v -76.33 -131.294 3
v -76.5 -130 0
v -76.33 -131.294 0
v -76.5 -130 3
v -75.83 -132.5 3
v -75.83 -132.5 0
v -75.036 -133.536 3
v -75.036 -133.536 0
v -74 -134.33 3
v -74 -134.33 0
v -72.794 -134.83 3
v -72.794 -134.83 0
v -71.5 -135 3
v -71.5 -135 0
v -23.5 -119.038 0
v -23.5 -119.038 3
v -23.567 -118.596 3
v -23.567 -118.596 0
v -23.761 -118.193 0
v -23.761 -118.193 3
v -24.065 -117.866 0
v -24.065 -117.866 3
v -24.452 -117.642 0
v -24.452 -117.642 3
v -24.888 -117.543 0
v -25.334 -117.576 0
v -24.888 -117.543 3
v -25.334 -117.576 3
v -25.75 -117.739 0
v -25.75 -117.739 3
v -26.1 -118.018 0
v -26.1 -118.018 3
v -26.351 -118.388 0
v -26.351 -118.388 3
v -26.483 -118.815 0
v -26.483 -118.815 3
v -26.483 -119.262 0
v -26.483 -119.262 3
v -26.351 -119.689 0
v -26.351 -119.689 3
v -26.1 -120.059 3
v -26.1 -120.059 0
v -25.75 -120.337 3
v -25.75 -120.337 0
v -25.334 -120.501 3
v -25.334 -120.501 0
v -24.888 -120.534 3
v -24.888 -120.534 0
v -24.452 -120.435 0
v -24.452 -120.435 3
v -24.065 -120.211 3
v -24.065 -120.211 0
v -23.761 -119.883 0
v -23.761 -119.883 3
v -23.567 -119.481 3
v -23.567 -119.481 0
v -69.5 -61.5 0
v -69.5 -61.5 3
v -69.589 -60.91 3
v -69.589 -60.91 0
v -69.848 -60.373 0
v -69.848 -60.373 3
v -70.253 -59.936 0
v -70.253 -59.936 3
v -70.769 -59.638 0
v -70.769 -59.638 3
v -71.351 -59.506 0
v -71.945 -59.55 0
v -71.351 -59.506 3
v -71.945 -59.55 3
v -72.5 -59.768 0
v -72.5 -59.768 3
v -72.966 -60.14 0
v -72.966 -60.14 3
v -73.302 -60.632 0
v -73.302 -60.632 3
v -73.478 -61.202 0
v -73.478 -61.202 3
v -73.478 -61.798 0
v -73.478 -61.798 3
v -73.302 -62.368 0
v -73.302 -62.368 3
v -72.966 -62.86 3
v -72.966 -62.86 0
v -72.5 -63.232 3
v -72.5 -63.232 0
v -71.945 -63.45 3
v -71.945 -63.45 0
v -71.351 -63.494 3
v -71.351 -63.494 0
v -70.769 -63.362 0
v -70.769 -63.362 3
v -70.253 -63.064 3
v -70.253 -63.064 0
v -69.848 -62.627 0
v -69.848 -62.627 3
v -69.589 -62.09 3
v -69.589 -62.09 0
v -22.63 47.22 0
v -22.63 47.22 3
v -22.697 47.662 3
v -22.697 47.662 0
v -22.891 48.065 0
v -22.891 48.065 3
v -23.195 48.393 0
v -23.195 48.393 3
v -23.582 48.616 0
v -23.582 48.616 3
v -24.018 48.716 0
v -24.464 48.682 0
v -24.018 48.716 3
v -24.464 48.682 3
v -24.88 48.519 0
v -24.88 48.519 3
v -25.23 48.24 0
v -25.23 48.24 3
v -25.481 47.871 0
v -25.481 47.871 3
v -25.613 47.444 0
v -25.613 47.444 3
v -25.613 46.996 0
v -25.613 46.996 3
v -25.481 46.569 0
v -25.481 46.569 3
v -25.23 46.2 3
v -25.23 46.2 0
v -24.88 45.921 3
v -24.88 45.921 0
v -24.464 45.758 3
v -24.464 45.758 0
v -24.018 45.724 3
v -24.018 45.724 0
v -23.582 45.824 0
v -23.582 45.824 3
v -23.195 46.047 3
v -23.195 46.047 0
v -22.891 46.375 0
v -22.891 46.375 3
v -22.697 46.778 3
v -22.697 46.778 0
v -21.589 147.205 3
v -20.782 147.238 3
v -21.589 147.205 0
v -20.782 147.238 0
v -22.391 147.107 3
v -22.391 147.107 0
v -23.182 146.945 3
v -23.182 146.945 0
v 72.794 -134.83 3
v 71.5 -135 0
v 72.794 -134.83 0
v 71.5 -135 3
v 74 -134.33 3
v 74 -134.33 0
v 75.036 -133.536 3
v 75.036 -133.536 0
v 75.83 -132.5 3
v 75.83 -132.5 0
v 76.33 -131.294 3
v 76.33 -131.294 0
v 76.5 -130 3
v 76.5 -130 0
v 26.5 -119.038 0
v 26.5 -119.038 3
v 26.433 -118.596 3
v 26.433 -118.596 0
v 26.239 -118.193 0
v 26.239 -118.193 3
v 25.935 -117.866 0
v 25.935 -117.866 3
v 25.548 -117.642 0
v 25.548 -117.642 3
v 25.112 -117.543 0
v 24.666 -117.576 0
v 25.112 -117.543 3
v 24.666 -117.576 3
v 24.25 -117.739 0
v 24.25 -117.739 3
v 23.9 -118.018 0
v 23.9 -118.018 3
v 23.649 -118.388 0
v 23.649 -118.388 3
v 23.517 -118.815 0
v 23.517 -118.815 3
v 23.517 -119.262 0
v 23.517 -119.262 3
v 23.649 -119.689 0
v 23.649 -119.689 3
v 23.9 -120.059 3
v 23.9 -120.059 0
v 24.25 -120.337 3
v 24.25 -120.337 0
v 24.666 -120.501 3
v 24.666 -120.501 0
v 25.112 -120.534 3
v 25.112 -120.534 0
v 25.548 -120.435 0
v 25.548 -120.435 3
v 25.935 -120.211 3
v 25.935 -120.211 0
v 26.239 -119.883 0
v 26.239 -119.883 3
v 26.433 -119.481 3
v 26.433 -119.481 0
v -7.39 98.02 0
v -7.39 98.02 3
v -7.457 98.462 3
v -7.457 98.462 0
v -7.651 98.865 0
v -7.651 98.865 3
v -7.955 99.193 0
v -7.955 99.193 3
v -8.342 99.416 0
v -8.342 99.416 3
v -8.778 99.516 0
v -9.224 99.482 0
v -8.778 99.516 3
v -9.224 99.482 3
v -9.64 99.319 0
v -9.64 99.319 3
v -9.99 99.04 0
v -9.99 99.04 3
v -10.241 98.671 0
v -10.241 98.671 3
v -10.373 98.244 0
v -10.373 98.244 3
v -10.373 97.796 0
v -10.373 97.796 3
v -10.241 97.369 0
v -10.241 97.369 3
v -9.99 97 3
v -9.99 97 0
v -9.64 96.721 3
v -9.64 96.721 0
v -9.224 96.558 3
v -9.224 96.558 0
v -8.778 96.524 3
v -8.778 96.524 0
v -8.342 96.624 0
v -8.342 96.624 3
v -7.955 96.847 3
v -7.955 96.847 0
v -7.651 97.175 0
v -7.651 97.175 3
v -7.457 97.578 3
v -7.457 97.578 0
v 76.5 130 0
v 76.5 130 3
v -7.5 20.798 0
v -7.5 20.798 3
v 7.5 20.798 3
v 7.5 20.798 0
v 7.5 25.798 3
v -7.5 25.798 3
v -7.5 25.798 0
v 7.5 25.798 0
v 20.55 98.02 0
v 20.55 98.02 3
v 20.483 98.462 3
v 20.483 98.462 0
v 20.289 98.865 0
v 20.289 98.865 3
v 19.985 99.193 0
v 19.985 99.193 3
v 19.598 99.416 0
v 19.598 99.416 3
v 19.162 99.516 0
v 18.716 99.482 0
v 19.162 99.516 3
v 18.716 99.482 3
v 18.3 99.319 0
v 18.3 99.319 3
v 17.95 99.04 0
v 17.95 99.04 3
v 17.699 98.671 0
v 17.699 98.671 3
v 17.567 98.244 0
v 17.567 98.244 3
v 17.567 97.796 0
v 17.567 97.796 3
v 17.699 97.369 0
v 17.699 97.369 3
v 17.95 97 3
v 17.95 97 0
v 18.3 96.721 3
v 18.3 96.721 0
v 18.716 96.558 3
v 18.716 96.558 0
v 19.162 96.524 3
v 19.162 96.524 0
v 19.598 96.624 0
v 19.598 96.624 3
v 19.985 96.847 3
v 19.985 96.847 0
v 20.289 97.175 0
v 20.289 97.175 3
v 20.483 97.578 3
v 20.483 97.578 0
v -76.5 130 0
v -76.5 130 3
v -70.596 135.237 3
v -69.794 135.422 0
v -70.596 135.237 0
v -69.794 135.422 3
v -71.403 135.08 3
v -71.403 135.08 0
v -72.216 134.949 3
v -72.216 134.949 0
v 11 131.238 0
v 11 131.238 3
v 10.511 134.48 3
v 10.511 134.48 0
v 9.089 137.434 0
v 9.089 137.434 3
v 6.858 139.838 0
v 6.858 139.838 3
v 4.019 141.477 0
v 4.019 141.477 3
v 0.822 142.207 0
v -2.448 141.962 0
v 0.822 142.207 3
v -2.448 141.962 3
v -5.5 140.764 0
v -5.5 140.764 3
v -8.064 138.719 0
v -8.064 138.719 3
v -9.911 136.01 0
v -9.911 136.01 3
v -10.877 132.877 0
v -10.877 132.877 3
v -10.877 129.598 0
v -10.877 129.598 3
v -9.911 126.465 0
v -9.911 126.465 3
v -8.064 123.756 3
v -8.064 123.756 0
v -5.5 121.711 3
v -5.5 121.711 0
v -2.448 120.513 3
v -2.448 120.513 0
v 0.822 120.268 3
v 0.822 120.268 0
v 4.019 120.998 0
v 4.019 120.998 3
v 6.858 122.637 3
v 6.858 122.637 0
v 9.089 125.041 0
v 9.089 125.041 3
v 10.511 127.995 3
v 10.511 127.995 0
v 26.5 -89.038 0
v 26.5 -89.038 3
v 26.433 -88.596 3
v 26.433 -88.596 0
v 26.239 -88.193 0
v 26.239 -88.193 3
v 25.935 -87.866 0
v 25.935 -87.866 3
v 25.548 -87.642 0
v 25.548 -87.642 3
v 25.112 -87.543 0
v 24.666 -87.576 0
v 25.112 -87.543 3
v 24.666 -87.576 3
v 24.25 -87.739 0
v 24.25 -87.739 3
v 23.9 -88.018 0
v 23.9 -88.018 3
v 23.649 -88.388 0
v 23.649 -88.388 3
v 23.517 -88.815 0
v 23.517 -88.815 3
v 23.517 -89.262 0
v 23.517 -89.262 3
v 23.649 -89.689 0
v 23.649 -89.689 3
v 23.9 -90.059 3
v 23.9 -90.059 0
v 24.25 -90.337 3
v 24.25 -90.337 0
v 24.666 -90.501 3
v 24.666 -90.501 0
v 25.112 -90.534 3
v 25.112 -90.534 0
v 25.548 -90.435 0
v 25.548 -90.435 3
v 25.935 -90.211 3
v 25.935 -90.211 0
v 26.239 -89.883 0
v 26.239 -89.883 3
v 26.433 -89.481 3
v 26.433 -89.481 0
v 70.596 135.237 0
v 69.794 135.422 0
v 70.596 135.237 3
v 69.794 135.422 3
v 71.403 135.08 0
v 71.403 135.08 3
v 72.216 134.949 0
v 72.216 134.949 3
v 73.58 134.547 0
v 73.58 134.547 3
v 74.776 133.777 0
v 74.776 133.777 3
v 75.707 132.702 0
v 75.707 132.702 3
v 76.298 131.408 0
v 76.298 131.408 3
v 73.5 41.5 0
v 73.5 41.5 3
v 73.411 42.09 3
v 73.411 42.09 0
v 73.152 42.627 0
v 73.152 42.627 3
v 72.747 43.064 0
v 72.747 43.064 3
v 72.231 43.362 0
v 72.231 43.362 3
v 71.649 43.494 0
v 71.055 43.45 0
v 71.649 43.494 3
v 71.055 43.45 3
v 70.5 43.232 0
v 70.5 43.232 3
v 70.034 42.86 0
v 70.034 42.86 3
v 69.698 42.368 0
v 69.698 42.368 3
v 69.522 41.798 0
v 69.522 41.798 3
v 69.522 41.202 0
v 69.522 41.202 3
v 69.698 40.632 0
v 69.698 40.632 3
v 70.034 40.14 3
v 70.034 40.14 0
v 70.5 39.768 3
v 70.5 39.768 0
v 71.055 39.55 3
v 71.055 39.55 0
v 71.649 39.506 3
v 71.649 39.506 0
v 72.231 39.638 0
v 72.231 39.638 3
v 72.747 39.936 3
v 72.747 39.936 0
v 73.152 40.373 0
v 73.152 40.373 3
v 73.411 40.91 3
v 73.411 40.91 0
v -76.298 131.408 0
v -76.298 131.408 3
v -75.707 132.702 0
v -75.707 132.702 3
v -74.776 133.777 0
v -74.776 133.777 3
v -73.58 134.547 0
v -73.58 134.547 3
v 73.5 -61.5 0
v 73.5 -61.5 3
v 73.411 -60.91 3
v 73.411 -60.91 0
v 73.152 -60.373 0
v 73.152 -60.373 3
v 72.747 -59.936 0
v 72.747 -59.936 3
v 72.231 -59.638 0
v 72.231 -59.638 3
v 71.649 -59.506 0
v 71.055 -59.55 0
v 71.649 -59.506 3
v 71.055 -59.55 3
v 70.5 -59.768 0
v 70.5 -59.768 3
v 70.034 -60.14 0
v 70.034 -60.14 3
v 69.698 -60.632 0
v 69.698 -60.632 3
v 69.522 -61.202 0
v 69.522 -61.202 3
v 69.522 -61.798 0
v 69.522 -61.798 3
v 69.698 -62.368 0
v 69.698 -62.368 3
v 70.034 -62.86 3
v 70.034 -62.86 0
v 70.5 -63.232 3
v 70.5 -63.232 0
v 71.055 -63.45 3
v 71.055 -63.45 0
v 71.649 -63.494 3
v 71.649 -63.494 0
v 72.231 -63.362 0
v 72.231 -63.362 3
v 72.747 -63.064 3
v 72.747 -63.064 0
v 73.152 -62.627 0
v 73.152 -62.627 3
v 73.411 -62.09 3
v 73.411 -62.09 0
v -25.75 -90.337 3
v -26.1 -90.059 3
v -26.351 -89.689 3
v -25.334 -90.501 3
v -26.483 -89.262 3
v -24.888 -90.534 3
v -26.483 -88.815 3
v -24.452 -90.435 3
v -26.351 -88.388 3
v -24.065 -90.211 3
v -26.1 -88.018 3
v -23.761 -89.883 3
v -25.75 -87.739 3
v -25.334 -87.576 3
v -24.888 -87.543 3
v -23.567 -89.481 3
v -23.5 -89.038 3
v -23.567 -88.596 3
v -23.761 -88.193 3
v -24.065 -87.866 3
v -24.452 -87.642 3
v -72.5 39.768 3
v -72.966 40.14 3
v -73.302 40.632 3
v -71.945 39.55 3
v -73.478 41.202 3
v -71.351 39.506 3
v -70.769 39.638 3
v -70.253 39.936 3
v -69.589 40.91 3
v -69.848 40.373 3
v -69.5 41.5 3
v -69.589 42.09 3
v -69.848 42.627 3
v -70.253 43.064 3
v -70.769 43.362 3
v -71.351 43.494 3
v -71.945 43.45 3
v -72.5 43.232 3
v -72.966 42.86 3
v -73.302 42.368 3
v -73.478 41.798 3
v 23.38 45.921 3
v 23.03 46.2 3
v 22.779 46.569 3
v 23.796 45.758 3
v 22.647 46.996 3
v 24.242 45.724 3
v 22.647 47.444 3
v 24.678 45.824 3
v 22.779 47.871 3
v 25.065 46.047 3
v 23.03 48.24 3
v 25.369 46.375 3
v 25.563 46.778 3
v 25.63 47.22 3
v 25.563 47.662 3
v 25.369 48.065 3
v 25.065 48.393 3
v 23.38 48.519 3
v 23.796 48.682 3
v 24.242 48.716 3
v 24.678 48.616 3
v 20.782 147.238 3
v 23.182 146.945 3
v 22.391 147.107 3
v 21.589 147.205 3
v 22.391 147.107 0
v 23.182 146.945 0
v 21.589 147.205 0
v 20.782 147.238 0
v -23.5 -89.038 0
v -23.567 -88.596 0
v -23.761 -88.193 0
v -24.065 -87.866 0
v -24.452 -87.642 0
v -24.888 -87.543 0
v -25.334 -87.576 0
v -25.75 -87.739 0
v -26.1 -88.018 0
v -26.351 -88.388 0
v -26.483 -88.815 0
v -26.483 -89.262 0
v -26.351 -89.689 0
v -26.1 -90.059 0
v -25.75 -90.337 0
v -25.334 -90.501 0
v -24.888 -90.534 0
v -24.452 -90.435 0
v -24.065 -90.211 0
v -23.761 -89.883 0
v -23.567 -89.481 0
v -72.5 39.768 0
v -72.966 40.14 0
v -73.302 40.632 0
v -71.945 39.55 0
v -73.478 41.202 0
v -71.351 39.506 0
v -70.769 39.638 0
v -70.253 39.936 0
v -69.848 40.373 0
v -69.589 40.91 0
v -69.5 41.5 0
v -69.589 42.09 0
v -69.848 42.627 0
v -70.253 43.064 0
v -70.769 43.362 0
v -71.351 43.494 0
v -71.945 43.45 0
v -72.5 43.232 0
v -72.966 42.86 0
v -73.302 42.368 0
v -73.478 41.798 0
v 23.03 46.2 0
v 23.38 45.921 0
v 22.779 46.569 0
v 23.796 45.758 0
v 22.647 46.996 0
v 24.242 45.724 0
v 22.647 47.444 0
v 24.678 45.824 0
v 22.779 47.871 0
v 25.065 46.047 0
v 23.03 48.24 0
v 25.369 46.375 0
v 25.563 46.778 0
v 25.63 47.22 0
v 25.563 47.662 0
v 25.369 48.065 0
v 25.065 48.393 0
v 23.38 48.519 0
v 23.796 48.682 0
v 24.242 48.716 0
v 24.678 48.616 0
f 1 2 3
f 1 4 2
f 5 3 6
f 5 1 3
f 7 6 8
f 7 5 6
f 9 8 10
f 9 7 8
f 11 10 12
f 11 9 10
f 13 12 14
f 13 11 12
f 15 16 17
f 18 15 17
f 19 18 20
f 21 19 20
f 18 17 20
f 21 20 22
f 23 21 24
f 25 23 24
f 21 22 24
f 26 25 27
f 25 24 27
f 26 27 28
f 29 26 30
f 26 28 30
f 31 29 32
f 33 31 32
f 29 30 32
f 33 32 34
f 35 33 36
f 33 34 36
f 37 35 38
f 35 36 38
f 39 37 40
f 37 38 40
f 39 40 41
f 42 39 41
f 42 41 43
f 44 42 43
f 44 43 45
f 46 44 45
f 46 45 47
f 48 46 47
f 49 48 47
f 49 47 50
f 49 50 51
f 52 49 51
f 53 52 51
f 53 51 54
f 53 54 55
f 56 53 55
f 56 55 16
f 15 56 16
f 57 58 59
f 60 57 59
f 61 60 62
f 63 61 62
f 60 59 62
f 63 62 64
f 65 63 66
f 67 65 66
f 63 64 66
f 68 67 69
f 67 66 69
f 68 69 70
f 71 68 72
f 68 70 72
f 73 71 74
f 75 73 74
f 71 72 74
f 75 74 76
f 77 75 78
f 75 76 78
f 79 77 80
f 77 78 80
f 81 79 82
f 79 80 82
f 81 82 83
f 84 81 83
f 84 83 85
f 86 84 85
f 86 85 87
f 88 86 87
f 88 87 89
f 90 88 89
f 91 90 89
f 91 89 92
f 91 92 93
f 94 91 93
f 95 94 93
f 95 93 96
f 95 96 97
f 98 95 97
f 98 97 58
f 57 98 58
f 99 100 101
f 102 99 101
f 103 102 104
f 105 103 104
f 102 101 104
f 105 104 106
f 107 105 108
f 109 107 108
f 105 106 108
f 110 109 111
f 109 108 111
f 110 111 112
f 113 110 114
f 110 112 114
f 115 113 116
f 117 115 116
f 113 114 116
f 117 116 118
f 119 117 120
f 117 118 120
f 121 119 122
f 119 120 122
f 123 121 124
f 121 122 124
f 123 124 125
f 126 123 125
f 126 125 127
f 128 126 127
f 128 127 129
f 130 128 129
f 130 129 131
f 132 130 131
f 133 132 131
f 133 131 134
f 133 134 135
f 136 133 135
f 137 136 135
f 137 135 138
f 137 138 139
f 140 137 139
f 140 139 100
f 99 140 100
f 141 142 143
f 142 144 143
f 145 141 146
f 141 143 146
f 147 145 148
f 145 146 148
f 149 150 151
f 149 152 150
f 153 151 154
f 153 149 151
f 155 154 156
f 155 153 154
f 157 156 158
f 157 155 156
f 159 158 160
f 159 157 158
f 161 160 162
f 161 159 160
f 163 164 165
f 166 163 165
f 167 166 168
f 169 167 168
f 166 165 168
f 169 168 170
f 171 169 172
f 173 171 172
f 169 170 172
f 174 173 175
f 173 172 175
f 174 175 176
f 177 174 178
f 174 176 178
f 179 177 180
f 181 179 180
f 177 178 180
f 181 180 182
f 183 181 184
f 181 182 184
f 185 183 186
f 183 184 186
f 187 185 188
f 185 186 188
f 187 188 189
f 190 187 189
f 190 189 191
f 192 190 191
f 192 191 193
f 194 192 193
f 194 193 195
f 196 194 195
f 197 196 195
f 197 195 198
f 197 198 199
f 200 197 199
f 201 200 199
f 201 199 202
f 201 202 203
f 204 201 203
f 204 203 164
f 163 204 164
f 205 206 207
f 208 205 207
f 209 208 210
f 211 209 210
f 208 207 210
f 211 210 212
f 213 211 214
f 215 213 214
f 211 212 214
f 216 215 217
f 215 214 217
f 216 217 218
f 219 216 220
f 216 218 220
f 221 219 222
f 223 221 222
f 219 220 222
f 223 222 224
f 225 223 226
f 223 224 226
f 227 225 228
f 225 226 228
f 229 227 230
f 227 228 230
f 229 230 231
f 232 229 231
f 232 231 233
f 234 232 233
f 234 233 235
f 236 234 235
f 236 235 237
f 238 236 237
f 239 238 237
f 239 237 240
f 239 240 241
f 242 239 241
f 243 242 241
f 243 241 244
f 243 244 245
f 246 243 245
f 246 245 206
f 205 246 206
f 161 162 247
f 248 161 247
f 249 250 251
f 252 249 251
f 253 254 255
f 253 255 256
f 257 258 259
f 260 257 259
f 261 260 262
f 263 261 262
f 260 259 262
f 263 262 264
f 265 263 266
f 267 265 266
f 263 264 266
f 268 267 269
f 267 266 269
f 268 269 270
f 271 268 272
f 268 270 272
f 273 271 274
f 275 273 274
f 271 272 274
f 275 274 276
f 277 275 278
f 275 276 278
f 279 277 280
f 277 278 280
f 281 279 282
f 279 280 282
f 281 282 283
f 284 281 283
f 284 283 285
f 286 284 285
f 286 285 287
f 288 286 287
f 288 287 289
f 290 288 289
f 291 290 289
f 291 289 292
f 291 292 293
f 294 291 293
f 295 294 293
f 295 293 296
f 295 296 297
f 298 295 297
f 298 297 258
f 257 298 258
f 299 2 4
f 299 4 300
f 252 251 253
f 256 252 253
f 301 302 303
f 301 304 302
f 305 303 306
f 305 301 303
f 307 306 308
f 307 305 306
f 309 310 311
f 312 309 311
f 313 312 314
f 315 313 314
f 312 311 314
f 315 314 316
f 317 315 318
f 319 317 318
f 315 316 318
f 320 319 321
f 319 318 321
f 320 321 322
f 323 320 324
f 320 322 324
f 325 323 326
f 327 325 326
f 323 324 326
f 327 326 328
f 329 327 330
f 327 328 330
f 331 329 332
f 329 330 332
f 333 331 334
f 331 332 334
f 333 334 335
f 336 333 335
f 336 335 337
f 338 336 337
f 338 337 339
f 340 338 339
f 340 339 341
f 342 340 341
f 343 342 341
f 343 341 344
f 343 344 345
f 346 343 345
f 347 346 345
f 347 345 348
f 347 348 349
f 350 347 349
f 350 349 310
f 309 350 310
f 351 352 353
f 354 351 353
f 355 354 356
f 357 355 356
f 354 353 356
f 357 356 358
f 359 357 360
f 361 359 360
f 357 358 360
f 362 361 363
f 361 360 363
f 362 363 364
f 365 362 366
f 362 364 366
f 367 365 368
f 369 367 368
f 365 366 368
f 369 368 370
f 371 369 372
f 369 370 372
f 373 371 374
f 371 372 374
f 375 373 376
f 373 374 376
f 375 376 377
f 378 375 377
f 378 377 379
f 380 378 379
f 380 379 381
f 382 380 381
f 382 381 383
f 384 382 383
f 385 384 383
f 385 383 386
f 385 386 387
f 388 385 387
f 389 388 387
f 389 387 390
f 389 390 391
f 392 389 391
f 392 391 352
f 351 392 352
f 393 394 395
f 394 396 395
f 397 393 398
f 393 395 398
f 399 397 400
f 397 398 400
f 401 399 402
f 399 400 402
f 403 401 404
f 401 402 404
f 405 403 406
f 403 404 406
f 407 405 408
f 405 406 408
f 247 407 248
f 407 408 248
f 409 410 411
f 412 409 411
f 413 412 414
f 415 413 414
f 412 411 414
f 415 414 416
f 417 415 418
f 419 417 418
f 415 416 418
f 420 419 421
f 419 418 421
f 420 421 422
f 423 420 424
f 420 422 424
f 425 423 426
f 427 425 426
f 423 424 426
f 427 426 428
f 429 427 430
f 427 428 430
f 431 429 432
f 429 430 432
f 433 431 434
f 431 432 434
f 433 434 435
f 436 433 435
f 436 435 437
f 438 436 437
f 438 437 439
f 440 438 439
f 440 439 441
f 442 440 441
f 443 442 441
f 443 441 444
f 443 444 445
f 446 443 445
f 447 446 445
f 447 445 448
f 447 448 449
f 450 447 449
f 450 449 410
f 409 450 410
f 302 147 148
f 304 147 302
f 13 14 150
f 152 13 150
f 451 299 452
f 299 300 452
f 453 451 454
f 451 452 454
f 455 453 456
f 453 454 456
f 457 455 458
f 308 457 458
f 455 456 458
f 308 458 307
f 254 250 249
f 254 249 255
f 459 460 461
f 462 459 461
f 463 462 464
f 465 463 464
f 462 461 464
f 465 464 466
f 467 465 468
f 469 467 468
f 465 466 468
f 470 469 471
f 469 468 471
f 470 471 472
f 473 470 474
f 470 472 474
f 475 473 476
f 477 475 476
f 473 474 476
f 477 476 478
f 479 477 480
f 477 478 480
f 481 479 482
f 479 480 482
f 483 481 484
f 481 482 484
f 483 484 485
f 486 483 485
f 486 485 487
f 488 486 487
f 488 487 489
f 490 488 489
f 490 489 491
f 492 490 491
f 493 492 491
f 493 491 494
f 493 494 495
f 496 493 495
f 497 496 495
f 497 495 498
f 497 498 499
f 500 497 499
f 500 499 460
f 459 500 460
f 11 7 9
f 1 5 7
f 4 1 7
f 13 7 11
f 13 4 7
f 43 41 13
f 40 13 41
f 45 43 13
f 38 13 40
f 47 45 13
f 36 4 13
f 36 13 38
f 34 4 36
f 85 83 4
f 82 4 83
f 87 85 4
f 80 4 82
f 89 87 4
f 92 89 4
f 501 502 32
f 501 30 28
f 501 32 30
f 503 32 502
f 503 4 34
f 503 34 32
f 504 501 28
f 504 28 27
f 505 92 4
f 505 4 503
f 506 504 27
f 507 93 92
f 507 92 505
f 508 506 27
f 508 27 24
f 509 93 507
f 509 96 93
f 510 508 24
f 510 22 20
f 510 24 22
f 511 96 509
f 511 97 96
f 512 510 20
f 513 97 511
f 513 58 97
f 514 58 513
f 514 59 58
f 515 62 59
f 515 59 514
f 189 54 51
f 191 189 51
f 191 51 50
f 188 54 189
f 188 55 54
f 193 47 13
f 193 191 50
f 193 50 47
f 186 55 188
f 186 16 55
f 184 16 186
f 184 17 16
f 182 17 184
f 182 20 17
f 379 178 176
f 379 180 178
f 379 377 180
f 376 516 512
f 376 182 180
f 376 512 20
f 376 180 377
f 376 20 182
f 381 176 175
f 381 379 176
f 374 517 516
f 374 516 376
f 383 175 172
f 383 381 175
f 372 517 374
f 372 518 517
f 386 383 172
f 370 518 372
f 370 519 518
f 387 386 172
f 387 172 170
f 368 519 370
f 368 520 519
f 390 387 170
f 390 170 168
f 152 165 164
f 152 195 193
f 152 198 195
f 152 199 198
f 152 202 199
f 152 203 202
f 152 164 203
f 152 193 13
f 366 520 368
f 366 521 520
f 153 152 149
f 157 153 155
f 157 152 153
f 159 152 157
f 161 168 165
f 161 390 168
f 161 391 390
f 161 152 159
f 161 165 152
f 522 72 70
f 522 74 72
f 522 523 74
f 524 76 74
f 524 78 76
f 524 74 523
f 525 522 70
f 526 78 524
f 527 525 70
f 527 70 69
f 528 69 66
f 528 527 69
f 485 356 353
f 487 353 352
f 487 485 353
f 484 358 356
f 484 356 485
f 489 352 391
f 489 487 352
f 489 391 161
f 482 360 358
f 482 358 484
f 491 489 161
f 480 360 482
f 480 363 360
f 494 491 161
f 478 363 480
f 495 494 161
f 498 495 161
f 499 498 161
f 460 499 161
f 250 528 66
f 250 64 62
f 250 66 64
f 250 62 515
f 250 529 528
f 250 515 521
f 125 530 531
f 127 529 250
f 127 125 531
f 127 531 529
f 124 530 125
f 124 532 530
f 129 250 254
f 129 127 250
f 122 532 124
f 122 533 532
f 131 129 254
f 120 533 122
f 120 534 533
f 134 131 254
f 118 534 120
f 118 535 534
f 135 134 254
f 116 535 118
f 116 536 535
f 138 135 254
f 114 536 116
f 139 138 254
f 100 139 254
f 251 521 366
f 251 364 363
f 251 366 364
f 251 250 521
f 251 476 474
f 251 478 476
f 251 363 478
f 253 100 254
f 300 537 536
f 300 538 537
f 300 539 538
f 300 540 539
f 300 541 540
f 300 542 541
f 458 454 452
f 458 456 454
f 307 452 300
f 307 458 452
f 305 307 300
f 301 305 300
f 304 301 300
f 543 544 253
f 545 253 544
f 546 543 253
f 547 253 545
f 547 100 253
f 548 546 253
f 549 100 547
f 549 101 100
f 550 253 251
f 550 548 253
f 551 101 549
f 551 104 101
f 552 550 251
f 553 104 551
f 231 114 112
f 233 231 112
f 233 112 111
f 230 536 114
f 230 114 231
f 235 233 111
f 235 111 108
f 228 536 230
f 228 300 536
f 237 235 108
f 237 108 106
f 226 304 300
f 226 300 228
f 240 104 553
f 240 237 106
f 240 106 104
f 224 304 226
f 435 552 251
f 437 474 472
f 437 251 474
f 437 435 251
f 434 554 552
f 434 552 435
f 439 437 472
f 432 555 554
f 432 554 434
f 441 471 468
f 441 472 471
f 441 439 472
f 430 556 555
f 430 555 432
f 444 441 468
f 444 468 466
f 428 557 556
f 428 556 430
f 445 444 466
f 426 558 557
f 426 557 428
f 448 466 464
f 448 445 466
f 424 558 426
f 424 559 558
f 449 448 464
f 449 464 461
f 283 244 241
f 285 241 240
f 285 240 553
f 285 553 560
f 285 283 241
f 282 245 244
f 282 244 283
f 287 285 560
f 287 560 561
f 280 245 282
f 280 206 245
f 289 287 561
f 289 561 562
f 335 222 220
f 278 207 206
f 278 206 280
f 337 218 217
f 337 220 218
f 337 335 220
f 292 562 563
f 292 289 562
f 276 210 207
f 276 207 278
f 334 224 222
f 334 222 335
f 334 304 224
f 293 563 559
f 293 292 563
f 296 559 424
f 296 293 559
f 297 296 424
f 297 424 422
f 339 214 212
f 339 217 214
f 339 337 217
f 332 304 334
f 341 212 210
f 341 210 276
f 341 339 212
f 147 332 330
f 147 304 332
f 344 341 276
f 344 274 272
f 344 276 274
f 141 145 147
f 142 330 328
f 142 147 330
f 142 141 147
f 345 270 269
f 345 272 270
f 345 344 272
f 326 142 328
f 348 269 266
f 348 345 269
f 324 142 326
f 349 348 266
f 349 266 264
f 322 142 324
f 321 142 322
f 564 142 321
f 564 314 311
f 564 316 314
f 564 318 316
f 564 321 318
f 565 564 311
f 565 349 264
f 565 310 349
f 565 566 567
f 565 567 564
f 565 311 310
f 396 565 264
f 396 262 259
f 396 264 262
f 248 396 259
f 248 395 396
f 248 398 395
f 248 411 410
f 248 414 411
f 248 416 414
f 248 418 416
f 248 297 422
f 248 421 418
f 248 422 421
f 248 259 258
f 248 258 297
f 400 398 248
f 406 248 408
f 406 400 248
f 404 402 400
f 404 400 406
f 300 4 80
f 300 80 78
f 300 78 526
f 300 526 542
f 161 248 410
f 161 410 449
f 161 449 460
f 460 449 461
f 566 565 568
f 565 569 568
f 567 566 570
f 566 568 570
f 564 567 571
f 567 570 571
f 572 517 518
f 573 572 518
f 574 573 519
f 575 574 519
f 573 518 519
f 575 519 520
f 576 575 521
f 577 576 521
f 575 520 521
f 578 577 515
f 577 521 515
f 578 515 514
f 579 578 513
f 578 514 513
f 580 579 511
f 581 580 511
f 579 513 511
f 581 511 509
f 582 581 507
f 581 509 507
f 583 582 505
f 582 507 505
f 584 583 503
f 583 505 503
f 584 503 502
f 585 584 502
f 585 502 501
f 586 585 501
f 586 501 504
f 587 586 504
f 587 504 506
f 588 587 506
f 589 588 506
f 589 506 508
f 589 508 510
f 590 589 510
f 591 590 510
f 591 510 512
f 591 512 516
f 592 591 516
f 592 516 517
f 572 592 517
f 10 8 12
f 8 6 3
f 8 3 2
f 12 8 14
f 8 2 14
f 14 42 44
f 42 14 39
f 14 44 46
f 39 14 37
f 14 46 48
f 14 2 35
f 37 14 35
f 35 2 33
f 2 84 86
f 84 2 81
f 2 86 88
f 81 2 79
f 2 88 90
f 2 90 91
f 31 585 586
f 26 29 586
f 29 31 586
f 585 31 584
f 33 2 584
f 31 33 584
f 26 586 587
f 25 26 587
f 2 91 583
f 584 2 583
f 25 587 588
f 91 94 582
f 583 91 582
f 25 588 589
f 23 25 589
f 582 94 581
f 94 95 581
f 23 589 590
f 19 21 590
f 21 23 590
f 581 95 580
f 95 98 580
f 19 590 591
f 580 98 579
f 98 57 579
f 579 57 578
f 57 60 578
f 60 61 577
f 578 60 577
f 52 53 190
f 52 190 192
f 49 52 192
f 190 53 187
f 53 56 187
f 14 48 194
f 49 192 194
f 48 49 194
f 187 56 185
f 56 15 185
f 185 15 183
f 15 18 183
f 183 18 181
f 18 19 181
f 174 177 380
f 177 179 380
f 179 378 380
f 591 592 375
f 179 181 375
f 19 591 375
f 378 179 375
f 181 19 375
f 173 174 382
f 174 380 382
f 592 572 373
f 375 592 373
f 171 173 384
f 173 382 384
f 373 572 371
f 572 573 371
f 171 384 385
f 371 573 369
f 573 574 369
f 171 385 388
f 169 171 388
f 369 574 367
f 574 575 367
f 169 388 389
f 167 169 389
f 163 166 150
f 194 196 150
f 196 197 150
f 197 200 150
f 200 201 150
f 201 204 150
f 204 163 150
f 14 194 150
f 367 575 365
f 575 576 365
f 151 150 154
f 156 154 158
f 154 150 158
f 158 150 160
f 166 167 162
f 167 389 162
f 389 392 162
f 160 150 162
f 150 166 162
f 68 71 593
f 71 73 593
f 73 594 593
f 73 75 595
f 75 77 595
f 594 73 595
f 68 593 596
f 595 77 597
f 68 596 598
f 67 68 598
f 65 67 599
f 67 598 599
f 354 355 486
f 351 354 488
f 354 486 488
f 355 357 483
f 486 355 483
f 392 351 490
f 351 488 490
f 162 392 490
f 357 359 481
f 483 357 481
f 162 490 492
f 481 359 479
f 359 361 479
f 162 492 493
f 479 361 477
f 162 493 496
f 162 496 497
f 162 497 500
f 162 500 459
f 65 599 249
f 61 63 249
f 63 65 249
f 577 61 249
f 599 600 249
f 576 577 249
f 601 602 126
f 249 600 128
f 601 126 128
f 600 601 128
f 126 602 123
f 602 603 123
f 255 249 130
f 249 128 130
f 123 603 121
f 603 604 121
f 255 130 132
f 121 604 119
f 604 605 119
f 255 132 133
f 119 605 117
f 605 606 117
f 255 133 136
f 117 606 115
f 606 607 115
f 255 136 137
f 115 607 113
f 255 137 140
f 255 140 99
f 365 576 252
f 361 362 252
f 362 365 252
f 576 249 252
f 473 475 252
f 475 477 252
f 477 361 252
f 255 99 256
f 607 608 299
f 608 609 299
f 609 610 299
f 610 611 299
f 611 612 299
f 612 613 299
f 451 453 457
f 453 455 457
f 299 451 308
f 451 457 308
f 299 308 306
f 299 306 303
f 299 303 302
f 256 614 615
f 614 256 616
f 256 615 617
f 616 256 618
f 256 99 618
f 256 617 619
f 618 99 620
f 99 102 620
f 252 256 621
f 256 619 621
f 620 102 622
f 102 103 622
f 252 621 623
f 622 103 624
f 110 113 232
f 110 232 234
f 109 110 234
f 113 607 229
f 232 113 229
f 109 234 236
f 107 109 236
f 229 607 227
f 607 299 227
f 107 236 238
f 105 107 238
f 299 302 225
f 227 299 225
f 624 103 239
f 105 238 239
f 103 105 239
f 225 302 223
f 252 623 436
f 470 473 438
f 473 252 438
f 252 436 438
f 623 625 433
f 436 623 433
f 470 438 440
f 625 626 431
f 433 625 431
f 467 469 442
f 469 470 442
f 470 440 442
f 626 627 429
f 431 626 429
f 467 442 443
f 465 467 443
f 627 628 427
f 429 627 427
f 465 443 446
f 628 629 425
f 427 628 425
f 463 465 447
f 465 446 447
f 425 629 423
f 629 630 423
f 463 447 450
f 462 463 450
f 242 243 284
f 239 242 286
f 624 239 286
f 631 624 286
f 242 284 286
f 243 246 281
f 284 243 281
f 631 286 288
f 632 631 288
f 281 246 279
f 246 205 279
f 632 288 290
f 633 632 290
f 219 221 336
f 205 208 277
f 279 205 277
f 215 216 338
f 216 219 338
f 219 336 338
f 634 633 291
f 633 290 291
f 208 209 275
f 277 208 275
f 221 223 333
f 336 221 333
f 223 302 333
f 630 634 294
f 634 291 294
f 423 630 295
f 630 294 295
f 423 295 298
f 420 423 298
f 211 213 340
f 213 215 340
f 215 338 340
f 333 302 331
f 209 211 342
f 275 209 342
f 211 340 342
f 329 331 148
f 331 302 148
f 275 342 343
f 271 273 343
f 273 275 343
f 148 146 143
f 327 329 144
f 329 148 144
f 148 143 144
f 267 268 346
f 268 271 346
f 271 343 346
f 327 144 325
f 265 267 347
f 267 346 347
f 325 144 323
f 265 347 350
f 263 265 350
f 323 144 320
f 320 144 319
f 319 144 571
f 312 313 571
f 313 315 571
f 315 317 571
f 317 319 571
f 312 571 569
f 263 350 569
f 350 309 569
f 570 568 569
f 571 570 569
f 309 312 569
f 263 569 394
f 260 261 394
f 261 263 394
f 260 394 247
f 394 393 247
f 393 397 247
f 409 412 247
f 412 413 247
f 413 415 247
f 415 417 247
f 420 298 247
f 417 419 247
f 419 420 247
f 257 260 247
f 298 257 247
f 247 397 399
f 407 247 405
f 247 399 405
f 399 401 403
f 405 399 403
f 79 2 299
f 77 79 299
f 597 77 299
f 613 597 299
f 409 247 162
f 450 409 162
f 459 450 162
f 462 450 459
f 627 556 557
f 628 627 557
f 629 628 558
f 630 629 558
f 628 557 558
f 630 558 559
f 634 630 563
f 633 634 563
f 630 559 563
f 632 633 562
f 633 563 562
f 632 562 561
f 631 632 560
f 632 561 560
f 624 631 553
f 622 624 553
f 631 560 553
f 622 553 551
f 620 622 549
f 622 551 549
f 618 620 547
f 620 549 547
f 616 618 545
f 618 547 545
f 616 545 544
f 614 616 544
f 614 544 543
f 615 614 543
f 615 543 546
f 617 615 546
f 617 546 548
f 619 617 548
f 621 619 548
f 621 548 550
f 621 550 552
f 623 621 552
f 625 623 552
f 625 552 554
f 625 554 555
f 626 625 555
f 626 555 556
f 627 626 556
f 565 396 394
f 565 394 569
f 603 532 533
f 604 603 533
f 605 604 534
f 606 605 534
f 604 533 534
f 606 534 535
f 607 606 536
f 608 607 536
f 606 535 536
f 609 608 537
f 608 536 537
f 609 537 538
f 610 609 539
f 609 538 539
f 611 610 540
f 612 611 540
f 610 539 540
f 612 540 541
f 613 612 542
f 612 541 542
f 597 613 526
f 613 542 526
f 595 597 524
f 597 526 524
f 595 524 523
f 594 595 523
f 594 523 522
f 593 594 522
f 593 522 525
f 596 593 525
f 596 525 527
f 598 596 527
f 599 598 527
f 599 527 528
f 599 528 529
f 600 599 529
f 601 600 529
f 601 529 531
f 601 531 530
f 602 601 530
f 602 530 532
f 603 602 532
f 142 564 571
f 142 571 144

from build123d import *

# Parameters (mm, degrees)
CROQUIS1_W              = 153
CROQUIS1_H              = 270
SALIENTE_EXTRUIR1_DEPTH = 3
CROQUIS2_R              = 2
CORTAR_EXTRUIR1_DEPTH   = 4
REDONDEO1_R             = 5
SALIENTE_EXTRUIR2_DEPTH = 3
REDONDEO2_R             = 25
REDONDEO3_R             = 10
CROQUIS5_R              = 11
CORTAR_EXTRUIR3_DEPTH   = 4
CROQUIS6_R              = 1.5
CROQUIS6_W              = 15
CROQUIS6_H              = 5
CORTAR_EXTRUIR4_DEPTH   = 4
CROQUIS7_R              = 1.5
CORTAR_EXTRUIR5_DEPTH   = 10


with BuildPart() as part:
    # Croquis1 → Saliente-Extruir1 (new body)
    with BuildSketch(Plane.XY):
        Rectangle(CROQUIS1_W, CROQUIS1_H)
    extrude(amount=SALIENTE_EXTRUIR1_DEPTH)

    # Croquis2 → Cortar-Extruir1 (cut, through all)
    with BuildSketch(Plane.XY.offset(3)):
        with Locations((-71.5, 41.5)):
            Circle(CROQUIS2_R)
        with Locations((-71.5, -61.5)):
            Circle(CROQUIS2_R)
        with Locations((71.5, -61.5)):
            Circle(CROQUIS2_R)
        with Locations((71.5, 41.5)):
            Circle(CROQUIS2_R)
    extrude(amount=-CORTAR_EXTRUIR1_DEPTH, mode=Mode.SUBTRACT)

    # Redondeo1
    redondeo1_edges = [part.edges().sort_by_distance(p)[0] for p in [
        (76.5, -135, 1.5),
        (-76.5, -135, 1.5),
        (-76.5, 135, 1.5),
        (76.5, 135, 1.5),
    ]]
    fillet(redondeo1_edges, radius=REDONDEO1_R)

    # Croquis4 → Saliente-Extruir2 (add)
    with BuildSketch(Plane.XY.offset(3)):
        Polygon((22, 147.2375), (-22, 147.2375), (-71.5, 135), (71.5, 135), align=None)
    extrude(amount=-SALIENTE_EXTRUIR2_DEPTH)

    # Redondeo2
    redondeo2_edges = [part.edges().sort_by_distance(p)[0] for p in [
        (-71.5, 135, 1.5),
        (71.5, 135, 1.5),
    ]]
    fillet(redondeo2_edges, radius=REDONDEO2_R)

    # Redondeo3
    redondeo3_edges = [part.edges().sort_by_distance(p)[0] for p in [
        (22, 147.2375, 1.5),
        (-22, 147.2375, 1.5),
    ]]
    fillet(redondeo3_edges, radius=REDONDEO3_R)

    # Croquis5 → Cortar-Extruir3 (cut, through all)
    with BuildSketch(Plane.XY.offset(3)):
        with Locations((0, 131.2375)):
            Circle(CROQUIS5_R)
    extrude(amount=-CORTAR_EXTRUIR3_DEPTH, mode=Mode.SUBTRACT)

    # Croquis6 → Cortar-Extruir4 (cut, through all)
    with BuildSketch(Plane.XY.offset(3)):
        with Locations((-8.89, 98.0200592)):
            Circle(CROQUIS6_R)
        with Locations((19.05, 98.0200592)):
            Circle(CROQUIS6_R)
        with Locations((24.13, 47.2200592)):
            Circle(CROQUIS6_R)
        with Locations((-24.13, 47.2200592)):
            Circle(CROQUIS6_R)
        with Locations((0, 23.297668012)):
            Rectangle(CROQUIS6_W, CROQUIS6_H)
    extrude(amount=-CORTAR_EXTRUIR4_DEPTH, mode=Mode.SUBTRACT)

    # Croquis7 → Cortar-Extruir5 (cut)
    with BuildSketch(Plane.XY.offset(3)):
        with Locations((-25, -89.038395192)):
            Circle(CROQUIS7_R)
        with Locations((25, -89.038395192)):
            Circle(CROQUIS7_R)
        with Locations((-25, -119.038395192)):
            Circle(CROQUIS7_R)
        with Locations((25, -119.038395192)):
            Circle(CROQUIS7_R)
    extrude(amount=-CORTAR_EXTRUIR5_DEPTH, mode=Mode.SUBTRACT)


solid = part.part
